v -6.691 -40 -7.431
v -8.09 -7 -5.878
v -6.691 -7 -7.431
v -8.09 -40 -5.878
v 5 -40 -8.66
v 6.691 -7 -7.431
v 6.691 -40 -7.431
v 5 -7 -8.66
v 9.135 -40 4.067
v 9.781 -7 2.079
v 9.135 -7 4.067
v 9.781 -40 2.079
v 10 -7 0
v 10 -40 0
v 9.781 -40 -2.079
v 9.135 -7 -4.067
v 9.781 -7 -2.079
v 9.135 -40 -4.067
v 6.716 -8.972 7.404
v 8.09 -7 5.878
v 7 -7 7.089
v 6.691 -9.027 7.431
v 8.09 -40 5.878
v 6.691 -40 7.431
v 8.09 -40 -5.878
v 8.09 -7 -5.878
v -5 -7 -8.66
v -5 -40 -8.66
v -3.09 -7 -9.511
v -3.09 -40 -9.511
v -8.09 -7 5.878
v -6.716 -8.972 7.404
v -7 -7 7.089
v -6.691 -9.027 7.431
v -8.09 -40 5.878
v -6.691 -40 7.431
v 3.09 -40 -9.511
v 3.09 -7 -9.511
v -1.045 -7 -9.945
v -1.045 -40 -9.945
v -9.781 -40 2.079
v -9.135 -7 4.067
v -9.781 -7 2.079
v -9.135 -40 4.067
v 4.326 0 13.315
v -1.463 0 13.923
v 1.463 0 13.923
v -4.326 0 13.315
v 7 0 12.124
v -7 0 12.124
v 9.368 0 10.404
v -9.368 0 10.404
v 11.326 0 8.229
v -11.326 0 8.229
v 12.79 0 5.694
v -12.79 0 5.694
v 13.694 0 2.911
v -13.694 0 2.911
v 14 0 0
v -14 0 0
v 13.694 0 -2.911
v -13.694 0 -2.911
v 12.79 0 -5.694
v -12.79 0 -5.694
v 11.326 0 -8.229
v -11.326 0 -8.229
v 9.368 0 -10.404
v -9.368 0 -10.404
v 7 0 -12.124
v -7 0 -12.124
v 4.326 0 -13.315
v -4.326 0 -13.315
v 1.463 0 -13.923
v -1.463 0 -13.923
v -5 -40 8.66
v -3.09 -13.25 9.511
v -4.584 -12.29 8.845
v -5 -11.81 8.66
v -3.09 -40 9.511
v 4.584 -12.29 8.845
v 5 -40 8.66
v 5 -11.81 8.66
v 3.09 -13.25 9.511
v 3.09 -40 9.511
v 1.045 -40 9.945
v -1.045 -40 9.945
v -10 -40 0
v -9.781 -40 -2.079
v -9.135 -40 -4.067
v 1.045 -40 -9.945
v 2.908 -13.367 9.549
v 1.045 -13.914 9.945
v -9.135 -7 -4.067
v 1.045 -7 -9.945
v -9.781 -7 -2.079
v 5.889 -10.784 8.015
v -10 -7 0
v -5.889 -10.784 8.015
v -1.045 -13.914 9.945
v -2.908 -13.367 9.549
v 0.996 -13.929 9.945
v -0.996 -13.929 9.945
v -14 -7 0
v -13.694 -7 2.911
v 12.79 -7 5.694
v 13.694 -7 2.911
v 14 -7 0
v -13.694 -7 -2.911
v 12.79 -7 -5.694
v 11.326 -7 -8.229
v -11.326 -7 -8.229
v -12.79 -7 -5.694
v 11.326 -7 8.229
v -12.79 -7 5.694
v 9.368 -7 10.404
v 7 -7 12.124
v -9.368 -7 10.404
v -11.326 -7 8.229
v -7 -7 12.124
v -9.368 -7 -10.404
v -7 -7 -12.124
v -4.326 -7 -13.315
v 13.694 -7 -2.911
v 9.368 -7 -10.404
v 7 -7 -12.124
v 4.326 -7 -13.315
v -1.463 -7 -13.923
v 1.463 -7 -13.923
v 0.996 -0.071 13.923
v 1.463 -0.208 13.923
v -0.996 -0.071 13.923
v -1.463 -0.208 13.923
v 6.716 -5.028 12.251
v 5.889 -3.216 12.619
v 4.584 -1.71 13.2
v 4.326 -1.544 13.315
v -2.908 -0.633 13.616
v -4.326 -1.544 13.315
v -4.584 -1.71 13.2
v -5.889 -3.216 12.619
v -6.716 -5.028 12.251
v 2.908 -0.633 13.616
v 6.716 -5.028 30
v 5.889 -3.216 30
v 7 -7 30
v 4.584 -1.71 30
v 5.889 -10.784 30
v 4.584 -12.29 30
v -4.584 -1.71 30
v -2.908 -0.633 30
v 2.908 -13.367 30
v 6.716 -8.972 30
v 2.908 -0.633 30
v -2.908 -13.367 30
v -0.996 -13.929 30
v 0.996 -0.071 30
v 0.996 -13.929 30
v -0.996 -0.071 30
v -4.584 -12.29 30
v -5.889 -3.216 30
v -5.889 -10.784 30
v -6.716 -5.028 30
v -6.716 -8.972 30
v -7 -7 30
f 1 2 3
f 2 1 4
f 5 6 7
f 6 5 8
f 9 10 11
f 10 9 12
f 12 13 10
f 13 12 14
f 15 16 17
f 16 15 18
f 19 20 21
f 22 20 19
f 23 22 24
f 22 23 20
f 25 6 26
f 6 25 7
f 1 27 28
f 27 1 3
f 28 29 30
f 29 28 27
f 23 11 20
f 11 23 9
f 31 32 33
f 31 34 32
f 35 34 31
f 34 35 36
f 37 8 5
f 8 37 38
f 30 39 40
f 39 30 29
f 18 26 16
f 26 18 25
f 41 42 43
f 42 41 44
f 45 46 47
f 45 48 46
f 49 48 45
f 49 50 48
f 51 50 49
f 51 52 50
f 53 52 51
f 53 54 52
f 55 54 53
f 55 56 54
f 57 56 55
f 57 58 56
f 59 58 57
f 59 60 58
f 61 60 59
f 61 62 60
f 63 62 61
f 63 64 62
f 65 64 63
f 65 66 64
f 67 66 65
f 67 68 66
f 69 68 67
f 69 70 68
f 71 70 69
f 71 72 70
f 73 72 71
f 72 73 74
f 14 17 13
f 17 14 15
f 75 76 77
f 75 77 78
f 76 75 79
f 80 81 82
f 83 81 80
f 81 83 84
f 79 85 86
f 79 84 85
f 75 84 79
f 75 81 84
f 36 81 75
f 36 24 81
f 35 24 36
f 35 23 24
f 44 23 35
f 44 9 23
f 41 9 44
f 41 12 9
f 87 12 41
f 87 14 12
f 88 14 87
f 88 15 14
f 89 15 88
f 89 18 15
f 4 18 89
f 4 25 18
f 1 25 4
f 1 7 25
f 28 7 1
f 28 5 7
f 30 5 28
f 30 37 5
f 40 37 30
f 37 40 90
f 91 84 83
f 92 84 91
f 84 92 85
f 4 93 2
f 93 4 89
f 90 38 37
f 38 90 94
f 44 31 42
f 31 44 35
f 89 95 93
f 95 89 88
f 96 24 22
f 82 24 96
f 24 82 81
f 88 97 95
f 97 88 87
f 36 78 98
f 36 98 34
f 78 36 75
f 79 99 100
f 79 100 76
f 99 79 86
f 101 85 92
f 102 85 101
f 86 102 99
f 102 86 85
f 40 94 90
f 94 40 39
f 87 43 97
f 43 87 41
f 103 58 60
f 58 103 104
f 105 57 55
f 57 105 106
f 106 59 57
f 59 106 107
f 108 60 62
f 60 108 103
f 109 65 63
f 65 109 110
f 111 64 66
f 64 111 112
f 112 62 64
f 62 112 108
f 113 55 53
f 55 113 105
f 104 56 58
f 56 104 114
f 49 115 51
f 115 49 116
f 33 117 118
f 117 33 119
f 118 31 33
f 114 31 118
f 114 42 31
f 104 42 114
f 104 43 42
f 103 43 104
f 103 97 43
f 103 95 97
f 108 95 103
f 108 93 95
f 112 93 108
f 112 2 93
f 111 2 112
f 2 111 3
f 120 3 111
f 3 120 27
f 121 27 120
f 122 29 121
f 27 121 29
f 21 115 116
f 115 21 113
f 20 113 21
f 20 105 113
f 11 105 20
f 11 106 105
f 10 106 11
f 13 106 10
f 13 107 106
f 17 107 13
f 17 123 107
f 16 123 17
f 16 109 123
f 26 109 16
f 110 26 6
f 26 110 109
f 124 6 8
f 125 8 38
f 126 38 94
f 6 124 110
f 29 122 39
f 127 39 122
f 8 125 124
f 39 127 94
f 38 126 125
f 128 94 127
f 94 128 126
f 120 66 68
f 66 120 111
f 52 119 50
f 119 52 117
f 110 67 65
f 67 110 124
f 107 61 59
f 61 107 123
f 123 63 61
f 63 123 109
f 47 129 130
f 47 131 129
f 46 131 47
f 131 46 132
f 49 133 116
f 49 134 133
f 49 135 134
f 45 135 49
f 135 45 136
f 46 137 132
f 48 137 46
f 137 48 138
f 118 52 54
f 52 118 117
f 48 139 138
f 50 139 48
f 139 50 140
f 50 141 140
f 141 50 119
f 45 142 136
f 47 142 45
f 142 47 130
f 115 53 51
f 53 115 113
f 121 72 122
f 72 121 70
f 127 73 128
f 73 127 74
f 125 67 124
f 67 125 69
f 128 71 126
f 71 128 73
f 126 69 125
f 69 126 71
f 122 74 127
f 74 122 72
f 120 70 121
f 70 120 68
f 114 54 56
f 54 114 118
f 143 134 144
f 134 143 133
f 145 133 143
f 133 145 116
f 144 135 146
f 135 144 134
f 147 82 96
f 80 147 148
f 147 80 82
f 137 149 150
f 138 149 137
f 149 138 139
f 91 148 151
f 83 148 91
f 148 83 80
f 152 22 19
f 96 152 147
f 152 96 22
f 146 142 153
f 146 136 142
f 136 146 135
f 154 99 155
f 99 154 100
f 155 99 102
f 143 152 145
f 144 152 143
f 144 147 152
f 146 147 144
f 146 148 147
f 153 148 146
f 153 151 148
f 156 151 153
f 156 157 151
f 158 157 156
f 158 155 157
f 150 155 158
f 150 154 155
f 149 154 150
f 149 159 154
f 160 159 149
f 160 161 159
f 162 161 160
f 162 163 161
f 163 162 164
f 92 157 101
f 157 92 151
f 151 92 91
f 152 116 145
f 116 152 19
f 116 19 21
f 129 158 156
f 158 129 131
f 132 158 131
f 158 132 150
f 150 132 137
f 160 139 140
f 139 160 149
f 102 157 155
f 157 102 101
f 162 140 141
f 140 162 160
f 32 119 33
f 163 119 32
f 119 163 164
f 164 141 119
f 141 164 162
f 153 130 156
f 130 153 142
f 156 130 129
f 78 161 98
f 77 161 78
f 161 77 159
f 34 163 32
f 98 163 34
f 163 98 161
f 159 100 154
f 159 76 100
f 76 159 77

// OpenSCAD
rotate([90,0,0]) cylinder(h=40,r=10);
rotate([90,0,0]) cylinder(h=7,r=14);
translate([0,-7,0]) cylinder(h=30,r=7);
